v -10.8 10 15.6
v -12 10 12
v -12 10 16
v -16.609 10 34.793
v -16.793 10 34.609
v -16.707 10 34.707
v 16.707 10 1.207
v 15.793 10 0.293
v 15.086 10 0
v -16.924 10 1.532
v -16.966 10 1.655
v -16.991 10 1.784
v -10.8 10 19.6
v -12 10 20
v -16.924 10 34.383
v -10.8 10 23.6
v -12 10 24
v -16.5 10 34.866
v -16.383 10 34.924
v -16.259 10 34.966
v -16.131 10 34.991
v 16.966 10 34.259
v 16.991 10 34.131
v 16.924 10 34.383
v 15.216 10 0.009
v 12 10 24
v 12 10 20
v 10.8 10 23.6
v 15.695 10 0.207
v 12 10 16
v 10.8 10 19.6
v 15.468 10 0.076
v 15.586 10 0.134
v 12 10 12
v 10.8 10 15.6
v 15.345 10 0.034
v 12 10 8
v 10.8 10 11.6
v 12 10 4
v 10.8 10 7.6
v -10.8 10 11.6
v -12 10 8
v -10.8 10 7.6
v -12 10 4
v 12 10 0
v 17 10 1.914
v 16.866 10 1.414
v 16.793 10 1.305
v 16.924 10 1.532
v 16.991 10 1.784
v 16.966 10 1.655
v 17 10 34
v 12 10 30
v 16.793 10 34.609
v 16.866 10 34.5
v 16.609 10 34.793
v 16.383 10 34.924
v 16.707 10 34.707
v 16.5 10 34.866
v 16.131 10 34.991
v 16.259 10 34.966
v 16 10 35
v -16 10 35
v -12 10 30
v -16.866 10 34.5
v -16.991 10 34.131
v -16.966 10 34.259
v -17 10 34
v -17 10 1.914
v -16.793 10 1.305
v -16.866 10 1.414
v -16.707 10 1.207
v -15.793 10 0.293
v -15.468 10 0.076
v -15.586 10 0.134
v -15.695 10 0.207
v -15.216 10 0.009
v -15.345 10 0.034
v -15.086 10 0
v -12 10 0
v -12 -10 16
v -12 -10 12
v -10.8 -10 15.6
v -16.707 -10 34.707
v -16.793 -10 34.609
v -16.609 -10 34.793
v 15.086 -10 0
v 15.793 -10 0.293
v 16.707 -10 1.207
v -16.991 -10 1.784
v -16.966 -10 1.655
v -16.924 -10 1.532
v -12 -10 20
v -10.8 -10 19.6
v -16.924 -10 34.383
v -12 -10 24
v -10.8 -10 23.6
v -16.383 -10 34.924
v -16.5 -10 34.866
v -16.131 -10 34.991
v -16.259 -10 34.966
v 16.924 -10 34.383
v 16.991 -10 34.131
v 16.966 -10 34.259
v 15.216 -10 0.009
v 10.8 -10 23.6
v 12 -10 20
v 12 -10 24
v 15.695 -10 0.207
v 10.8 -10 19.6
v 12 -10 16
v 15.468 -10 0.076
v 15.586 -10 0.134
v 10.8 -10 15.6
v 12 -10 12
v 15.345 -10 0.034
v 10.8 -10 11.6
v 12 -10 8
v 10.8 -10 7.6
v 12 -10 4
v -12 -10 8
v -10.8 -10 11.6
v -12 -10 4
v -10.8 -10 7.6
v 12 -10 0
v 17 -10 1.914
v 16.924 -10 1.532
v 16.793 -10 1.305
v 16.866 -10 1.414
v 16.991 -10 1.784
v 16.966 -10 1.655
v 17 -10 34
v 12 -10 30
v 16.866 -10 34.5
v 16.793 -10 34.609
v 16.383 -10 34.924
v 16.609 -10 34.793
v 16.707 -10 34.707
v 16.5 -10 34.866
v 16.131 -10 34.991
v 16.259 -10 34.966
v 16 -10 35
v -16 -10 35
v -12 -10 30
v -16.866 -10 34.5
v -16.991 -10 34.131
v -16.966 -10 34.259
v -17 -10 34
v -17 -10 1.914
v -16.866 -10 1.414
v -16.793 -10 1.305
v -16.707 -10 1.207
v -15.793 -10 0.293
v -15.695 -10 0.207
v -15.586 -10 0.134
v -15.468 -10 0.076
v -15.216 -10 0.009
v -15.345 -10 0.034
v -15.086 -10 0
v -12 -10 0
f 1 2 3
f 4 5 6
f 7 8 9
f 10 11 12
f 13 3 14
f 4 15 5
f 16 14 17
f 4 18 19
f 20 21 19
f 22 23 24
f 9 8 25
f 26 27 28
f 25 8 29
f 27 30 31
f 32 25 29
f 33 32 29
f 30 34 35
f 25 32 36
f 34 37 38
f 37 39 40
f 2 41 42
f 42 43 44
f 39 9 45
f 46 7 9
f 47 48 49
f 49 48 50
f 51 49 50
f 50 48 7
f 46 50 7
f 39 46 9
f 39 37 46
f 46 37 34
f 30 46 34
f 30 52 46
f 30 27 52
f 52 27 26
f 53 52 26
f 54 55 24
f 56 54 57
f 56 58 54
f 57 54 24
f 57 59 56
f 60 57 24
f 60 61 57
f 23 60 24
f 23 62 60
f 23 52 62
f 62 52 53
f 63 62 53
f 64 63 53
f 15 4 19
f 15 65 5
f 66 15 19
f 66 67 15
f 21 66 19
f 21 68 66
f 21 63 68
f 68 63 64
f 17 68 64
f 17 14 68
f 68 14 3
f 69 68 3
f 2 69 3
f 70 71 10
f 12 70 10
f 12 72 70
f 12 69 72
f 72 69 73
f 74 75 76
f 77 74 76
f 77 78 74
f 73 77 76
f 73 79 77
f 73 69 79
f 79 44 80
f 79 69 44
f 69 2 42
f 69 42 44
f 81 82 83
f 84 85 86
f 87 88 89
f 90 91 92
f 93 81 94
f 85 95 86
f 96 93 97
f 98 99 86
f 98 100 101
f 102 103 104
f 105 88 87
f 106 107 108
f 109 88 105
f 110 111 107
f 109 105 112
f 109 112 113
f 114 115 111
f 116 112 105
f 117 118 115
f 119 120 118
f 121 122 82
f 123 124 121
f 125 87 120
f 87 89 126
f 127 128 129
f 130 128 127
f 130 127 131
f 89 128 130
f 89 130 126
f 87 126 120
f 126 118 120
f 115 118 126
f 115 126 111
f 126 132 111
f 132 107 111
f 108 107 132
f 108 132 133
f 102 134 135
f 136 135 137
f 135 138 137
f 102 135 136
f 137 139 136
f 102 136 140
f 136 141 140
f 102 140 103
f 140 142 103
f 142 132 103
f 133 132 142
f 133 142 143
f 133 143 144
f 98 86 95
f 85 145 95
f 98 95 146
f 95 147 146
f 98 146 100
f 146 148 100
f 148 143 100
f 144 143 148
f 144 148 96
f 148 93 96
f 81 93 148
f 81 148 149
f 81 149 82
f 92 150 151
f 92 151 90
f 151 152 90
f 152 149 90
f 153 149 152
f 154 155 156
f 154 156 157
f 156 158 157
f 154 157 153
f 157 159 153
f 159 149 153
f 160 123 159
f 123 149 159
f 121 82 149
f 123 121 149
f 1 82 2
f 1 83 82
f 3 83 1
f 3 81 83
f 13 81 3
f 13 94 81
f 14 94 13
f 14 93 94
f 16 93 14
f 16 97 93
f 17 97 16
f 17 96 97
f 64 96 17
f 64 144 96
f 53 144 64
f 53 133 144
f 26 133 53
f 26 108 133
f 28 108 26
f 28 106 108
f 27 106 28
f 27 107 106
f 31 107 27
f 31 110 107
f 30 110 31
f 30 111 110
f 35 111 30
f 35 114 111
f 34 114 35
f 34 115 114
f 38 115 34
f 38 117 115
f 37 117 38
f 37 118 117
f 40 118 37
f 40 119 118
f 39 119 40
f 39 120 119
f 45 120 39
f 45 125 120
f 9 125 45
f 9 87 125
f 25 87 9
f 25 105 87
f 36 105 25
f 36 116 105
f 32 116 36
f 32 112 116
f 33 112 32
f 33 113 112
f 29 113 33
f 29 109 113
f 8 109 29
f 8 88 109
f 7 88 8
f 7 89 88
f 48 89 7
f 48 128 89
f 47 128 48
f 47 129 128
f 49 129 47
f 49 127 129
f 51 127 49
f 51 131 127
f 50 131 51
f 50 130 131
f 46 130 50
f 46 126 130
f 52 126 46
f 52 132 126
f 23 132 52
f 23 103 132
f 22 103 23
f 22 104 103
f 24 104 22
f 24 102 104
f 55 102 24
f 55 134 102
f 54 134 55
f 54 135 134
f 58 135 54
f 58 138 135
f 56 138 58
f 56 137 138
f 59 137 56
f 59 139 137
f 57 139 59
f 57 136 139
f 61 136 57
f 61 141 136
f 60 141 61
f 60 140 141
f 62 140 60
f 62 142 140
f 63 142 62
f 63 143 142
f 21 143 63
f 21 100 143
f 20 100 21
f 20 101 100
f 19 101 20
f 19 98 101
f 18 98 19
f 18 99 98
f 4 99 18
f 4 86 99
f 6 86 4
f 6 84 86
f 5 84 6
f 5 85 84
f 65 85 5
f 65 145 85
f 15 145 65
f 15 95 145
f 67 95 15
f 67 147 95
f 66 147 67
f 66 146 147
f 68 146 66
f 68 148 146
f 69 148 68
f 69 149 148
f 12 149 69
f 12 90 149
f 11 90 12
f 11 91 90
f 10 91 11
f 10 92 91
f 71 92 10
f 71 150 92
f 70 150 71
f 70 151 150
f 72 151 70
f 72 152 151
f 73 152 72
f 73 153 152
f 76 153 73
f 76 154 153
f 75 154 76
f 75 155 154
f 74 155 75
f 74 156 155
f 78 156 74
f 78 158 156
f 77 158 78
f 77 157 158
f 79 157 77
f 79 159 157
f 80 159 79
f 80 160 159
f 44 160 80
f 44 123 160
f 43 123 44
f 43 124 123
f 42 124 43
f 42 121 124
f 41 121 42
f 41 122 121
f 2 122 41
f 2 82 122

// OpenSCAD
// ===== Klip ve tvaru Π pro uchycení kapsáře na čelo šuplíku =====
// (verze s výstupky na vnitřních stranách ramen)

// --- Parametry (mm) ---
inner_w   = 24;   // vnitřní šířka mezi rameny (tloušťka čela šuplíku)
tol       = 0;    // přidaná vůle k vnitřní šířce
thick     = 5;    // tloušťka materiálu (příčka i ramena)
leg_len   = 30;   // délka ramen (od spodní strany příčky)
clip_w    = 20;   // šířka klipu (rozměr podél hrany šuplíku)
round_r   = 1;    // zaoblení vnějších hran (0 = ostré)
tip_chamf = 1.5;  // zkosení konců ramen zvenku (0 = vypnuto)

// --- Výstupky (zuby) ---
bump_on     = true;  // zapnout/vypnout výstupky
bump_h      = 1.2;   // výška výstupku (do vnitřní mezery)
bump_pitch  = 4;     // rozteč zubů (délka jednoho zubu podél ramene)
bump_n      = 5;     // počet zubů na každém rameni
bump_start  = 4;     // vzdálenost prvního zubu od konce ramene

$fn = 48;

iw = inner_w + tol;
ow = iw + 2*thick;
oh = leg_len + thick;

// jeden zub: pozvolný náběh zespoda, strmá hrana nahoře (proti vytažení)
module tooth() {
    polygon([
        [0,      0],
        [bump_h, bump_pitch*0.9],
        [0,      bump_pitch]
    ]);
}

module teeth() {
    for (i = [0 : bump_n-1]) {
        y0 = bump_start + i*bump_pitch;
        // levé rameno
        translate([-iw/2, y0]) tooth();
        // pravé rameno (zrcadlově)
        translate([ iw/2, y0]) mirror([1,0]) tooth();
    }
}

// 2D profil klipu (písmeno Π)
module profile() {
    union() {
        difference() {
            offset(r = round_r) offset(delta = -round_r)
            polygon([
                [-ow/2 + tip_chamf, 0],
                [ ow/2 - tip_chamf, 0],
                [ ow/2,             tip_chamf],
                [ ow/2,             oh],
                [-ow/2,             oh],
                [-ow/2,             tip_chamf]
            ]);
            translate([-iw/2, -1]) square([iw, leg_len + 1]);
        }
        if (bump_on) teeth();
    }
}

module pi_clip() {
    rotate([90, 0, 0])
        linear_extrude(height = clip_w, center = true)
            profile();
}

pi_clip();
